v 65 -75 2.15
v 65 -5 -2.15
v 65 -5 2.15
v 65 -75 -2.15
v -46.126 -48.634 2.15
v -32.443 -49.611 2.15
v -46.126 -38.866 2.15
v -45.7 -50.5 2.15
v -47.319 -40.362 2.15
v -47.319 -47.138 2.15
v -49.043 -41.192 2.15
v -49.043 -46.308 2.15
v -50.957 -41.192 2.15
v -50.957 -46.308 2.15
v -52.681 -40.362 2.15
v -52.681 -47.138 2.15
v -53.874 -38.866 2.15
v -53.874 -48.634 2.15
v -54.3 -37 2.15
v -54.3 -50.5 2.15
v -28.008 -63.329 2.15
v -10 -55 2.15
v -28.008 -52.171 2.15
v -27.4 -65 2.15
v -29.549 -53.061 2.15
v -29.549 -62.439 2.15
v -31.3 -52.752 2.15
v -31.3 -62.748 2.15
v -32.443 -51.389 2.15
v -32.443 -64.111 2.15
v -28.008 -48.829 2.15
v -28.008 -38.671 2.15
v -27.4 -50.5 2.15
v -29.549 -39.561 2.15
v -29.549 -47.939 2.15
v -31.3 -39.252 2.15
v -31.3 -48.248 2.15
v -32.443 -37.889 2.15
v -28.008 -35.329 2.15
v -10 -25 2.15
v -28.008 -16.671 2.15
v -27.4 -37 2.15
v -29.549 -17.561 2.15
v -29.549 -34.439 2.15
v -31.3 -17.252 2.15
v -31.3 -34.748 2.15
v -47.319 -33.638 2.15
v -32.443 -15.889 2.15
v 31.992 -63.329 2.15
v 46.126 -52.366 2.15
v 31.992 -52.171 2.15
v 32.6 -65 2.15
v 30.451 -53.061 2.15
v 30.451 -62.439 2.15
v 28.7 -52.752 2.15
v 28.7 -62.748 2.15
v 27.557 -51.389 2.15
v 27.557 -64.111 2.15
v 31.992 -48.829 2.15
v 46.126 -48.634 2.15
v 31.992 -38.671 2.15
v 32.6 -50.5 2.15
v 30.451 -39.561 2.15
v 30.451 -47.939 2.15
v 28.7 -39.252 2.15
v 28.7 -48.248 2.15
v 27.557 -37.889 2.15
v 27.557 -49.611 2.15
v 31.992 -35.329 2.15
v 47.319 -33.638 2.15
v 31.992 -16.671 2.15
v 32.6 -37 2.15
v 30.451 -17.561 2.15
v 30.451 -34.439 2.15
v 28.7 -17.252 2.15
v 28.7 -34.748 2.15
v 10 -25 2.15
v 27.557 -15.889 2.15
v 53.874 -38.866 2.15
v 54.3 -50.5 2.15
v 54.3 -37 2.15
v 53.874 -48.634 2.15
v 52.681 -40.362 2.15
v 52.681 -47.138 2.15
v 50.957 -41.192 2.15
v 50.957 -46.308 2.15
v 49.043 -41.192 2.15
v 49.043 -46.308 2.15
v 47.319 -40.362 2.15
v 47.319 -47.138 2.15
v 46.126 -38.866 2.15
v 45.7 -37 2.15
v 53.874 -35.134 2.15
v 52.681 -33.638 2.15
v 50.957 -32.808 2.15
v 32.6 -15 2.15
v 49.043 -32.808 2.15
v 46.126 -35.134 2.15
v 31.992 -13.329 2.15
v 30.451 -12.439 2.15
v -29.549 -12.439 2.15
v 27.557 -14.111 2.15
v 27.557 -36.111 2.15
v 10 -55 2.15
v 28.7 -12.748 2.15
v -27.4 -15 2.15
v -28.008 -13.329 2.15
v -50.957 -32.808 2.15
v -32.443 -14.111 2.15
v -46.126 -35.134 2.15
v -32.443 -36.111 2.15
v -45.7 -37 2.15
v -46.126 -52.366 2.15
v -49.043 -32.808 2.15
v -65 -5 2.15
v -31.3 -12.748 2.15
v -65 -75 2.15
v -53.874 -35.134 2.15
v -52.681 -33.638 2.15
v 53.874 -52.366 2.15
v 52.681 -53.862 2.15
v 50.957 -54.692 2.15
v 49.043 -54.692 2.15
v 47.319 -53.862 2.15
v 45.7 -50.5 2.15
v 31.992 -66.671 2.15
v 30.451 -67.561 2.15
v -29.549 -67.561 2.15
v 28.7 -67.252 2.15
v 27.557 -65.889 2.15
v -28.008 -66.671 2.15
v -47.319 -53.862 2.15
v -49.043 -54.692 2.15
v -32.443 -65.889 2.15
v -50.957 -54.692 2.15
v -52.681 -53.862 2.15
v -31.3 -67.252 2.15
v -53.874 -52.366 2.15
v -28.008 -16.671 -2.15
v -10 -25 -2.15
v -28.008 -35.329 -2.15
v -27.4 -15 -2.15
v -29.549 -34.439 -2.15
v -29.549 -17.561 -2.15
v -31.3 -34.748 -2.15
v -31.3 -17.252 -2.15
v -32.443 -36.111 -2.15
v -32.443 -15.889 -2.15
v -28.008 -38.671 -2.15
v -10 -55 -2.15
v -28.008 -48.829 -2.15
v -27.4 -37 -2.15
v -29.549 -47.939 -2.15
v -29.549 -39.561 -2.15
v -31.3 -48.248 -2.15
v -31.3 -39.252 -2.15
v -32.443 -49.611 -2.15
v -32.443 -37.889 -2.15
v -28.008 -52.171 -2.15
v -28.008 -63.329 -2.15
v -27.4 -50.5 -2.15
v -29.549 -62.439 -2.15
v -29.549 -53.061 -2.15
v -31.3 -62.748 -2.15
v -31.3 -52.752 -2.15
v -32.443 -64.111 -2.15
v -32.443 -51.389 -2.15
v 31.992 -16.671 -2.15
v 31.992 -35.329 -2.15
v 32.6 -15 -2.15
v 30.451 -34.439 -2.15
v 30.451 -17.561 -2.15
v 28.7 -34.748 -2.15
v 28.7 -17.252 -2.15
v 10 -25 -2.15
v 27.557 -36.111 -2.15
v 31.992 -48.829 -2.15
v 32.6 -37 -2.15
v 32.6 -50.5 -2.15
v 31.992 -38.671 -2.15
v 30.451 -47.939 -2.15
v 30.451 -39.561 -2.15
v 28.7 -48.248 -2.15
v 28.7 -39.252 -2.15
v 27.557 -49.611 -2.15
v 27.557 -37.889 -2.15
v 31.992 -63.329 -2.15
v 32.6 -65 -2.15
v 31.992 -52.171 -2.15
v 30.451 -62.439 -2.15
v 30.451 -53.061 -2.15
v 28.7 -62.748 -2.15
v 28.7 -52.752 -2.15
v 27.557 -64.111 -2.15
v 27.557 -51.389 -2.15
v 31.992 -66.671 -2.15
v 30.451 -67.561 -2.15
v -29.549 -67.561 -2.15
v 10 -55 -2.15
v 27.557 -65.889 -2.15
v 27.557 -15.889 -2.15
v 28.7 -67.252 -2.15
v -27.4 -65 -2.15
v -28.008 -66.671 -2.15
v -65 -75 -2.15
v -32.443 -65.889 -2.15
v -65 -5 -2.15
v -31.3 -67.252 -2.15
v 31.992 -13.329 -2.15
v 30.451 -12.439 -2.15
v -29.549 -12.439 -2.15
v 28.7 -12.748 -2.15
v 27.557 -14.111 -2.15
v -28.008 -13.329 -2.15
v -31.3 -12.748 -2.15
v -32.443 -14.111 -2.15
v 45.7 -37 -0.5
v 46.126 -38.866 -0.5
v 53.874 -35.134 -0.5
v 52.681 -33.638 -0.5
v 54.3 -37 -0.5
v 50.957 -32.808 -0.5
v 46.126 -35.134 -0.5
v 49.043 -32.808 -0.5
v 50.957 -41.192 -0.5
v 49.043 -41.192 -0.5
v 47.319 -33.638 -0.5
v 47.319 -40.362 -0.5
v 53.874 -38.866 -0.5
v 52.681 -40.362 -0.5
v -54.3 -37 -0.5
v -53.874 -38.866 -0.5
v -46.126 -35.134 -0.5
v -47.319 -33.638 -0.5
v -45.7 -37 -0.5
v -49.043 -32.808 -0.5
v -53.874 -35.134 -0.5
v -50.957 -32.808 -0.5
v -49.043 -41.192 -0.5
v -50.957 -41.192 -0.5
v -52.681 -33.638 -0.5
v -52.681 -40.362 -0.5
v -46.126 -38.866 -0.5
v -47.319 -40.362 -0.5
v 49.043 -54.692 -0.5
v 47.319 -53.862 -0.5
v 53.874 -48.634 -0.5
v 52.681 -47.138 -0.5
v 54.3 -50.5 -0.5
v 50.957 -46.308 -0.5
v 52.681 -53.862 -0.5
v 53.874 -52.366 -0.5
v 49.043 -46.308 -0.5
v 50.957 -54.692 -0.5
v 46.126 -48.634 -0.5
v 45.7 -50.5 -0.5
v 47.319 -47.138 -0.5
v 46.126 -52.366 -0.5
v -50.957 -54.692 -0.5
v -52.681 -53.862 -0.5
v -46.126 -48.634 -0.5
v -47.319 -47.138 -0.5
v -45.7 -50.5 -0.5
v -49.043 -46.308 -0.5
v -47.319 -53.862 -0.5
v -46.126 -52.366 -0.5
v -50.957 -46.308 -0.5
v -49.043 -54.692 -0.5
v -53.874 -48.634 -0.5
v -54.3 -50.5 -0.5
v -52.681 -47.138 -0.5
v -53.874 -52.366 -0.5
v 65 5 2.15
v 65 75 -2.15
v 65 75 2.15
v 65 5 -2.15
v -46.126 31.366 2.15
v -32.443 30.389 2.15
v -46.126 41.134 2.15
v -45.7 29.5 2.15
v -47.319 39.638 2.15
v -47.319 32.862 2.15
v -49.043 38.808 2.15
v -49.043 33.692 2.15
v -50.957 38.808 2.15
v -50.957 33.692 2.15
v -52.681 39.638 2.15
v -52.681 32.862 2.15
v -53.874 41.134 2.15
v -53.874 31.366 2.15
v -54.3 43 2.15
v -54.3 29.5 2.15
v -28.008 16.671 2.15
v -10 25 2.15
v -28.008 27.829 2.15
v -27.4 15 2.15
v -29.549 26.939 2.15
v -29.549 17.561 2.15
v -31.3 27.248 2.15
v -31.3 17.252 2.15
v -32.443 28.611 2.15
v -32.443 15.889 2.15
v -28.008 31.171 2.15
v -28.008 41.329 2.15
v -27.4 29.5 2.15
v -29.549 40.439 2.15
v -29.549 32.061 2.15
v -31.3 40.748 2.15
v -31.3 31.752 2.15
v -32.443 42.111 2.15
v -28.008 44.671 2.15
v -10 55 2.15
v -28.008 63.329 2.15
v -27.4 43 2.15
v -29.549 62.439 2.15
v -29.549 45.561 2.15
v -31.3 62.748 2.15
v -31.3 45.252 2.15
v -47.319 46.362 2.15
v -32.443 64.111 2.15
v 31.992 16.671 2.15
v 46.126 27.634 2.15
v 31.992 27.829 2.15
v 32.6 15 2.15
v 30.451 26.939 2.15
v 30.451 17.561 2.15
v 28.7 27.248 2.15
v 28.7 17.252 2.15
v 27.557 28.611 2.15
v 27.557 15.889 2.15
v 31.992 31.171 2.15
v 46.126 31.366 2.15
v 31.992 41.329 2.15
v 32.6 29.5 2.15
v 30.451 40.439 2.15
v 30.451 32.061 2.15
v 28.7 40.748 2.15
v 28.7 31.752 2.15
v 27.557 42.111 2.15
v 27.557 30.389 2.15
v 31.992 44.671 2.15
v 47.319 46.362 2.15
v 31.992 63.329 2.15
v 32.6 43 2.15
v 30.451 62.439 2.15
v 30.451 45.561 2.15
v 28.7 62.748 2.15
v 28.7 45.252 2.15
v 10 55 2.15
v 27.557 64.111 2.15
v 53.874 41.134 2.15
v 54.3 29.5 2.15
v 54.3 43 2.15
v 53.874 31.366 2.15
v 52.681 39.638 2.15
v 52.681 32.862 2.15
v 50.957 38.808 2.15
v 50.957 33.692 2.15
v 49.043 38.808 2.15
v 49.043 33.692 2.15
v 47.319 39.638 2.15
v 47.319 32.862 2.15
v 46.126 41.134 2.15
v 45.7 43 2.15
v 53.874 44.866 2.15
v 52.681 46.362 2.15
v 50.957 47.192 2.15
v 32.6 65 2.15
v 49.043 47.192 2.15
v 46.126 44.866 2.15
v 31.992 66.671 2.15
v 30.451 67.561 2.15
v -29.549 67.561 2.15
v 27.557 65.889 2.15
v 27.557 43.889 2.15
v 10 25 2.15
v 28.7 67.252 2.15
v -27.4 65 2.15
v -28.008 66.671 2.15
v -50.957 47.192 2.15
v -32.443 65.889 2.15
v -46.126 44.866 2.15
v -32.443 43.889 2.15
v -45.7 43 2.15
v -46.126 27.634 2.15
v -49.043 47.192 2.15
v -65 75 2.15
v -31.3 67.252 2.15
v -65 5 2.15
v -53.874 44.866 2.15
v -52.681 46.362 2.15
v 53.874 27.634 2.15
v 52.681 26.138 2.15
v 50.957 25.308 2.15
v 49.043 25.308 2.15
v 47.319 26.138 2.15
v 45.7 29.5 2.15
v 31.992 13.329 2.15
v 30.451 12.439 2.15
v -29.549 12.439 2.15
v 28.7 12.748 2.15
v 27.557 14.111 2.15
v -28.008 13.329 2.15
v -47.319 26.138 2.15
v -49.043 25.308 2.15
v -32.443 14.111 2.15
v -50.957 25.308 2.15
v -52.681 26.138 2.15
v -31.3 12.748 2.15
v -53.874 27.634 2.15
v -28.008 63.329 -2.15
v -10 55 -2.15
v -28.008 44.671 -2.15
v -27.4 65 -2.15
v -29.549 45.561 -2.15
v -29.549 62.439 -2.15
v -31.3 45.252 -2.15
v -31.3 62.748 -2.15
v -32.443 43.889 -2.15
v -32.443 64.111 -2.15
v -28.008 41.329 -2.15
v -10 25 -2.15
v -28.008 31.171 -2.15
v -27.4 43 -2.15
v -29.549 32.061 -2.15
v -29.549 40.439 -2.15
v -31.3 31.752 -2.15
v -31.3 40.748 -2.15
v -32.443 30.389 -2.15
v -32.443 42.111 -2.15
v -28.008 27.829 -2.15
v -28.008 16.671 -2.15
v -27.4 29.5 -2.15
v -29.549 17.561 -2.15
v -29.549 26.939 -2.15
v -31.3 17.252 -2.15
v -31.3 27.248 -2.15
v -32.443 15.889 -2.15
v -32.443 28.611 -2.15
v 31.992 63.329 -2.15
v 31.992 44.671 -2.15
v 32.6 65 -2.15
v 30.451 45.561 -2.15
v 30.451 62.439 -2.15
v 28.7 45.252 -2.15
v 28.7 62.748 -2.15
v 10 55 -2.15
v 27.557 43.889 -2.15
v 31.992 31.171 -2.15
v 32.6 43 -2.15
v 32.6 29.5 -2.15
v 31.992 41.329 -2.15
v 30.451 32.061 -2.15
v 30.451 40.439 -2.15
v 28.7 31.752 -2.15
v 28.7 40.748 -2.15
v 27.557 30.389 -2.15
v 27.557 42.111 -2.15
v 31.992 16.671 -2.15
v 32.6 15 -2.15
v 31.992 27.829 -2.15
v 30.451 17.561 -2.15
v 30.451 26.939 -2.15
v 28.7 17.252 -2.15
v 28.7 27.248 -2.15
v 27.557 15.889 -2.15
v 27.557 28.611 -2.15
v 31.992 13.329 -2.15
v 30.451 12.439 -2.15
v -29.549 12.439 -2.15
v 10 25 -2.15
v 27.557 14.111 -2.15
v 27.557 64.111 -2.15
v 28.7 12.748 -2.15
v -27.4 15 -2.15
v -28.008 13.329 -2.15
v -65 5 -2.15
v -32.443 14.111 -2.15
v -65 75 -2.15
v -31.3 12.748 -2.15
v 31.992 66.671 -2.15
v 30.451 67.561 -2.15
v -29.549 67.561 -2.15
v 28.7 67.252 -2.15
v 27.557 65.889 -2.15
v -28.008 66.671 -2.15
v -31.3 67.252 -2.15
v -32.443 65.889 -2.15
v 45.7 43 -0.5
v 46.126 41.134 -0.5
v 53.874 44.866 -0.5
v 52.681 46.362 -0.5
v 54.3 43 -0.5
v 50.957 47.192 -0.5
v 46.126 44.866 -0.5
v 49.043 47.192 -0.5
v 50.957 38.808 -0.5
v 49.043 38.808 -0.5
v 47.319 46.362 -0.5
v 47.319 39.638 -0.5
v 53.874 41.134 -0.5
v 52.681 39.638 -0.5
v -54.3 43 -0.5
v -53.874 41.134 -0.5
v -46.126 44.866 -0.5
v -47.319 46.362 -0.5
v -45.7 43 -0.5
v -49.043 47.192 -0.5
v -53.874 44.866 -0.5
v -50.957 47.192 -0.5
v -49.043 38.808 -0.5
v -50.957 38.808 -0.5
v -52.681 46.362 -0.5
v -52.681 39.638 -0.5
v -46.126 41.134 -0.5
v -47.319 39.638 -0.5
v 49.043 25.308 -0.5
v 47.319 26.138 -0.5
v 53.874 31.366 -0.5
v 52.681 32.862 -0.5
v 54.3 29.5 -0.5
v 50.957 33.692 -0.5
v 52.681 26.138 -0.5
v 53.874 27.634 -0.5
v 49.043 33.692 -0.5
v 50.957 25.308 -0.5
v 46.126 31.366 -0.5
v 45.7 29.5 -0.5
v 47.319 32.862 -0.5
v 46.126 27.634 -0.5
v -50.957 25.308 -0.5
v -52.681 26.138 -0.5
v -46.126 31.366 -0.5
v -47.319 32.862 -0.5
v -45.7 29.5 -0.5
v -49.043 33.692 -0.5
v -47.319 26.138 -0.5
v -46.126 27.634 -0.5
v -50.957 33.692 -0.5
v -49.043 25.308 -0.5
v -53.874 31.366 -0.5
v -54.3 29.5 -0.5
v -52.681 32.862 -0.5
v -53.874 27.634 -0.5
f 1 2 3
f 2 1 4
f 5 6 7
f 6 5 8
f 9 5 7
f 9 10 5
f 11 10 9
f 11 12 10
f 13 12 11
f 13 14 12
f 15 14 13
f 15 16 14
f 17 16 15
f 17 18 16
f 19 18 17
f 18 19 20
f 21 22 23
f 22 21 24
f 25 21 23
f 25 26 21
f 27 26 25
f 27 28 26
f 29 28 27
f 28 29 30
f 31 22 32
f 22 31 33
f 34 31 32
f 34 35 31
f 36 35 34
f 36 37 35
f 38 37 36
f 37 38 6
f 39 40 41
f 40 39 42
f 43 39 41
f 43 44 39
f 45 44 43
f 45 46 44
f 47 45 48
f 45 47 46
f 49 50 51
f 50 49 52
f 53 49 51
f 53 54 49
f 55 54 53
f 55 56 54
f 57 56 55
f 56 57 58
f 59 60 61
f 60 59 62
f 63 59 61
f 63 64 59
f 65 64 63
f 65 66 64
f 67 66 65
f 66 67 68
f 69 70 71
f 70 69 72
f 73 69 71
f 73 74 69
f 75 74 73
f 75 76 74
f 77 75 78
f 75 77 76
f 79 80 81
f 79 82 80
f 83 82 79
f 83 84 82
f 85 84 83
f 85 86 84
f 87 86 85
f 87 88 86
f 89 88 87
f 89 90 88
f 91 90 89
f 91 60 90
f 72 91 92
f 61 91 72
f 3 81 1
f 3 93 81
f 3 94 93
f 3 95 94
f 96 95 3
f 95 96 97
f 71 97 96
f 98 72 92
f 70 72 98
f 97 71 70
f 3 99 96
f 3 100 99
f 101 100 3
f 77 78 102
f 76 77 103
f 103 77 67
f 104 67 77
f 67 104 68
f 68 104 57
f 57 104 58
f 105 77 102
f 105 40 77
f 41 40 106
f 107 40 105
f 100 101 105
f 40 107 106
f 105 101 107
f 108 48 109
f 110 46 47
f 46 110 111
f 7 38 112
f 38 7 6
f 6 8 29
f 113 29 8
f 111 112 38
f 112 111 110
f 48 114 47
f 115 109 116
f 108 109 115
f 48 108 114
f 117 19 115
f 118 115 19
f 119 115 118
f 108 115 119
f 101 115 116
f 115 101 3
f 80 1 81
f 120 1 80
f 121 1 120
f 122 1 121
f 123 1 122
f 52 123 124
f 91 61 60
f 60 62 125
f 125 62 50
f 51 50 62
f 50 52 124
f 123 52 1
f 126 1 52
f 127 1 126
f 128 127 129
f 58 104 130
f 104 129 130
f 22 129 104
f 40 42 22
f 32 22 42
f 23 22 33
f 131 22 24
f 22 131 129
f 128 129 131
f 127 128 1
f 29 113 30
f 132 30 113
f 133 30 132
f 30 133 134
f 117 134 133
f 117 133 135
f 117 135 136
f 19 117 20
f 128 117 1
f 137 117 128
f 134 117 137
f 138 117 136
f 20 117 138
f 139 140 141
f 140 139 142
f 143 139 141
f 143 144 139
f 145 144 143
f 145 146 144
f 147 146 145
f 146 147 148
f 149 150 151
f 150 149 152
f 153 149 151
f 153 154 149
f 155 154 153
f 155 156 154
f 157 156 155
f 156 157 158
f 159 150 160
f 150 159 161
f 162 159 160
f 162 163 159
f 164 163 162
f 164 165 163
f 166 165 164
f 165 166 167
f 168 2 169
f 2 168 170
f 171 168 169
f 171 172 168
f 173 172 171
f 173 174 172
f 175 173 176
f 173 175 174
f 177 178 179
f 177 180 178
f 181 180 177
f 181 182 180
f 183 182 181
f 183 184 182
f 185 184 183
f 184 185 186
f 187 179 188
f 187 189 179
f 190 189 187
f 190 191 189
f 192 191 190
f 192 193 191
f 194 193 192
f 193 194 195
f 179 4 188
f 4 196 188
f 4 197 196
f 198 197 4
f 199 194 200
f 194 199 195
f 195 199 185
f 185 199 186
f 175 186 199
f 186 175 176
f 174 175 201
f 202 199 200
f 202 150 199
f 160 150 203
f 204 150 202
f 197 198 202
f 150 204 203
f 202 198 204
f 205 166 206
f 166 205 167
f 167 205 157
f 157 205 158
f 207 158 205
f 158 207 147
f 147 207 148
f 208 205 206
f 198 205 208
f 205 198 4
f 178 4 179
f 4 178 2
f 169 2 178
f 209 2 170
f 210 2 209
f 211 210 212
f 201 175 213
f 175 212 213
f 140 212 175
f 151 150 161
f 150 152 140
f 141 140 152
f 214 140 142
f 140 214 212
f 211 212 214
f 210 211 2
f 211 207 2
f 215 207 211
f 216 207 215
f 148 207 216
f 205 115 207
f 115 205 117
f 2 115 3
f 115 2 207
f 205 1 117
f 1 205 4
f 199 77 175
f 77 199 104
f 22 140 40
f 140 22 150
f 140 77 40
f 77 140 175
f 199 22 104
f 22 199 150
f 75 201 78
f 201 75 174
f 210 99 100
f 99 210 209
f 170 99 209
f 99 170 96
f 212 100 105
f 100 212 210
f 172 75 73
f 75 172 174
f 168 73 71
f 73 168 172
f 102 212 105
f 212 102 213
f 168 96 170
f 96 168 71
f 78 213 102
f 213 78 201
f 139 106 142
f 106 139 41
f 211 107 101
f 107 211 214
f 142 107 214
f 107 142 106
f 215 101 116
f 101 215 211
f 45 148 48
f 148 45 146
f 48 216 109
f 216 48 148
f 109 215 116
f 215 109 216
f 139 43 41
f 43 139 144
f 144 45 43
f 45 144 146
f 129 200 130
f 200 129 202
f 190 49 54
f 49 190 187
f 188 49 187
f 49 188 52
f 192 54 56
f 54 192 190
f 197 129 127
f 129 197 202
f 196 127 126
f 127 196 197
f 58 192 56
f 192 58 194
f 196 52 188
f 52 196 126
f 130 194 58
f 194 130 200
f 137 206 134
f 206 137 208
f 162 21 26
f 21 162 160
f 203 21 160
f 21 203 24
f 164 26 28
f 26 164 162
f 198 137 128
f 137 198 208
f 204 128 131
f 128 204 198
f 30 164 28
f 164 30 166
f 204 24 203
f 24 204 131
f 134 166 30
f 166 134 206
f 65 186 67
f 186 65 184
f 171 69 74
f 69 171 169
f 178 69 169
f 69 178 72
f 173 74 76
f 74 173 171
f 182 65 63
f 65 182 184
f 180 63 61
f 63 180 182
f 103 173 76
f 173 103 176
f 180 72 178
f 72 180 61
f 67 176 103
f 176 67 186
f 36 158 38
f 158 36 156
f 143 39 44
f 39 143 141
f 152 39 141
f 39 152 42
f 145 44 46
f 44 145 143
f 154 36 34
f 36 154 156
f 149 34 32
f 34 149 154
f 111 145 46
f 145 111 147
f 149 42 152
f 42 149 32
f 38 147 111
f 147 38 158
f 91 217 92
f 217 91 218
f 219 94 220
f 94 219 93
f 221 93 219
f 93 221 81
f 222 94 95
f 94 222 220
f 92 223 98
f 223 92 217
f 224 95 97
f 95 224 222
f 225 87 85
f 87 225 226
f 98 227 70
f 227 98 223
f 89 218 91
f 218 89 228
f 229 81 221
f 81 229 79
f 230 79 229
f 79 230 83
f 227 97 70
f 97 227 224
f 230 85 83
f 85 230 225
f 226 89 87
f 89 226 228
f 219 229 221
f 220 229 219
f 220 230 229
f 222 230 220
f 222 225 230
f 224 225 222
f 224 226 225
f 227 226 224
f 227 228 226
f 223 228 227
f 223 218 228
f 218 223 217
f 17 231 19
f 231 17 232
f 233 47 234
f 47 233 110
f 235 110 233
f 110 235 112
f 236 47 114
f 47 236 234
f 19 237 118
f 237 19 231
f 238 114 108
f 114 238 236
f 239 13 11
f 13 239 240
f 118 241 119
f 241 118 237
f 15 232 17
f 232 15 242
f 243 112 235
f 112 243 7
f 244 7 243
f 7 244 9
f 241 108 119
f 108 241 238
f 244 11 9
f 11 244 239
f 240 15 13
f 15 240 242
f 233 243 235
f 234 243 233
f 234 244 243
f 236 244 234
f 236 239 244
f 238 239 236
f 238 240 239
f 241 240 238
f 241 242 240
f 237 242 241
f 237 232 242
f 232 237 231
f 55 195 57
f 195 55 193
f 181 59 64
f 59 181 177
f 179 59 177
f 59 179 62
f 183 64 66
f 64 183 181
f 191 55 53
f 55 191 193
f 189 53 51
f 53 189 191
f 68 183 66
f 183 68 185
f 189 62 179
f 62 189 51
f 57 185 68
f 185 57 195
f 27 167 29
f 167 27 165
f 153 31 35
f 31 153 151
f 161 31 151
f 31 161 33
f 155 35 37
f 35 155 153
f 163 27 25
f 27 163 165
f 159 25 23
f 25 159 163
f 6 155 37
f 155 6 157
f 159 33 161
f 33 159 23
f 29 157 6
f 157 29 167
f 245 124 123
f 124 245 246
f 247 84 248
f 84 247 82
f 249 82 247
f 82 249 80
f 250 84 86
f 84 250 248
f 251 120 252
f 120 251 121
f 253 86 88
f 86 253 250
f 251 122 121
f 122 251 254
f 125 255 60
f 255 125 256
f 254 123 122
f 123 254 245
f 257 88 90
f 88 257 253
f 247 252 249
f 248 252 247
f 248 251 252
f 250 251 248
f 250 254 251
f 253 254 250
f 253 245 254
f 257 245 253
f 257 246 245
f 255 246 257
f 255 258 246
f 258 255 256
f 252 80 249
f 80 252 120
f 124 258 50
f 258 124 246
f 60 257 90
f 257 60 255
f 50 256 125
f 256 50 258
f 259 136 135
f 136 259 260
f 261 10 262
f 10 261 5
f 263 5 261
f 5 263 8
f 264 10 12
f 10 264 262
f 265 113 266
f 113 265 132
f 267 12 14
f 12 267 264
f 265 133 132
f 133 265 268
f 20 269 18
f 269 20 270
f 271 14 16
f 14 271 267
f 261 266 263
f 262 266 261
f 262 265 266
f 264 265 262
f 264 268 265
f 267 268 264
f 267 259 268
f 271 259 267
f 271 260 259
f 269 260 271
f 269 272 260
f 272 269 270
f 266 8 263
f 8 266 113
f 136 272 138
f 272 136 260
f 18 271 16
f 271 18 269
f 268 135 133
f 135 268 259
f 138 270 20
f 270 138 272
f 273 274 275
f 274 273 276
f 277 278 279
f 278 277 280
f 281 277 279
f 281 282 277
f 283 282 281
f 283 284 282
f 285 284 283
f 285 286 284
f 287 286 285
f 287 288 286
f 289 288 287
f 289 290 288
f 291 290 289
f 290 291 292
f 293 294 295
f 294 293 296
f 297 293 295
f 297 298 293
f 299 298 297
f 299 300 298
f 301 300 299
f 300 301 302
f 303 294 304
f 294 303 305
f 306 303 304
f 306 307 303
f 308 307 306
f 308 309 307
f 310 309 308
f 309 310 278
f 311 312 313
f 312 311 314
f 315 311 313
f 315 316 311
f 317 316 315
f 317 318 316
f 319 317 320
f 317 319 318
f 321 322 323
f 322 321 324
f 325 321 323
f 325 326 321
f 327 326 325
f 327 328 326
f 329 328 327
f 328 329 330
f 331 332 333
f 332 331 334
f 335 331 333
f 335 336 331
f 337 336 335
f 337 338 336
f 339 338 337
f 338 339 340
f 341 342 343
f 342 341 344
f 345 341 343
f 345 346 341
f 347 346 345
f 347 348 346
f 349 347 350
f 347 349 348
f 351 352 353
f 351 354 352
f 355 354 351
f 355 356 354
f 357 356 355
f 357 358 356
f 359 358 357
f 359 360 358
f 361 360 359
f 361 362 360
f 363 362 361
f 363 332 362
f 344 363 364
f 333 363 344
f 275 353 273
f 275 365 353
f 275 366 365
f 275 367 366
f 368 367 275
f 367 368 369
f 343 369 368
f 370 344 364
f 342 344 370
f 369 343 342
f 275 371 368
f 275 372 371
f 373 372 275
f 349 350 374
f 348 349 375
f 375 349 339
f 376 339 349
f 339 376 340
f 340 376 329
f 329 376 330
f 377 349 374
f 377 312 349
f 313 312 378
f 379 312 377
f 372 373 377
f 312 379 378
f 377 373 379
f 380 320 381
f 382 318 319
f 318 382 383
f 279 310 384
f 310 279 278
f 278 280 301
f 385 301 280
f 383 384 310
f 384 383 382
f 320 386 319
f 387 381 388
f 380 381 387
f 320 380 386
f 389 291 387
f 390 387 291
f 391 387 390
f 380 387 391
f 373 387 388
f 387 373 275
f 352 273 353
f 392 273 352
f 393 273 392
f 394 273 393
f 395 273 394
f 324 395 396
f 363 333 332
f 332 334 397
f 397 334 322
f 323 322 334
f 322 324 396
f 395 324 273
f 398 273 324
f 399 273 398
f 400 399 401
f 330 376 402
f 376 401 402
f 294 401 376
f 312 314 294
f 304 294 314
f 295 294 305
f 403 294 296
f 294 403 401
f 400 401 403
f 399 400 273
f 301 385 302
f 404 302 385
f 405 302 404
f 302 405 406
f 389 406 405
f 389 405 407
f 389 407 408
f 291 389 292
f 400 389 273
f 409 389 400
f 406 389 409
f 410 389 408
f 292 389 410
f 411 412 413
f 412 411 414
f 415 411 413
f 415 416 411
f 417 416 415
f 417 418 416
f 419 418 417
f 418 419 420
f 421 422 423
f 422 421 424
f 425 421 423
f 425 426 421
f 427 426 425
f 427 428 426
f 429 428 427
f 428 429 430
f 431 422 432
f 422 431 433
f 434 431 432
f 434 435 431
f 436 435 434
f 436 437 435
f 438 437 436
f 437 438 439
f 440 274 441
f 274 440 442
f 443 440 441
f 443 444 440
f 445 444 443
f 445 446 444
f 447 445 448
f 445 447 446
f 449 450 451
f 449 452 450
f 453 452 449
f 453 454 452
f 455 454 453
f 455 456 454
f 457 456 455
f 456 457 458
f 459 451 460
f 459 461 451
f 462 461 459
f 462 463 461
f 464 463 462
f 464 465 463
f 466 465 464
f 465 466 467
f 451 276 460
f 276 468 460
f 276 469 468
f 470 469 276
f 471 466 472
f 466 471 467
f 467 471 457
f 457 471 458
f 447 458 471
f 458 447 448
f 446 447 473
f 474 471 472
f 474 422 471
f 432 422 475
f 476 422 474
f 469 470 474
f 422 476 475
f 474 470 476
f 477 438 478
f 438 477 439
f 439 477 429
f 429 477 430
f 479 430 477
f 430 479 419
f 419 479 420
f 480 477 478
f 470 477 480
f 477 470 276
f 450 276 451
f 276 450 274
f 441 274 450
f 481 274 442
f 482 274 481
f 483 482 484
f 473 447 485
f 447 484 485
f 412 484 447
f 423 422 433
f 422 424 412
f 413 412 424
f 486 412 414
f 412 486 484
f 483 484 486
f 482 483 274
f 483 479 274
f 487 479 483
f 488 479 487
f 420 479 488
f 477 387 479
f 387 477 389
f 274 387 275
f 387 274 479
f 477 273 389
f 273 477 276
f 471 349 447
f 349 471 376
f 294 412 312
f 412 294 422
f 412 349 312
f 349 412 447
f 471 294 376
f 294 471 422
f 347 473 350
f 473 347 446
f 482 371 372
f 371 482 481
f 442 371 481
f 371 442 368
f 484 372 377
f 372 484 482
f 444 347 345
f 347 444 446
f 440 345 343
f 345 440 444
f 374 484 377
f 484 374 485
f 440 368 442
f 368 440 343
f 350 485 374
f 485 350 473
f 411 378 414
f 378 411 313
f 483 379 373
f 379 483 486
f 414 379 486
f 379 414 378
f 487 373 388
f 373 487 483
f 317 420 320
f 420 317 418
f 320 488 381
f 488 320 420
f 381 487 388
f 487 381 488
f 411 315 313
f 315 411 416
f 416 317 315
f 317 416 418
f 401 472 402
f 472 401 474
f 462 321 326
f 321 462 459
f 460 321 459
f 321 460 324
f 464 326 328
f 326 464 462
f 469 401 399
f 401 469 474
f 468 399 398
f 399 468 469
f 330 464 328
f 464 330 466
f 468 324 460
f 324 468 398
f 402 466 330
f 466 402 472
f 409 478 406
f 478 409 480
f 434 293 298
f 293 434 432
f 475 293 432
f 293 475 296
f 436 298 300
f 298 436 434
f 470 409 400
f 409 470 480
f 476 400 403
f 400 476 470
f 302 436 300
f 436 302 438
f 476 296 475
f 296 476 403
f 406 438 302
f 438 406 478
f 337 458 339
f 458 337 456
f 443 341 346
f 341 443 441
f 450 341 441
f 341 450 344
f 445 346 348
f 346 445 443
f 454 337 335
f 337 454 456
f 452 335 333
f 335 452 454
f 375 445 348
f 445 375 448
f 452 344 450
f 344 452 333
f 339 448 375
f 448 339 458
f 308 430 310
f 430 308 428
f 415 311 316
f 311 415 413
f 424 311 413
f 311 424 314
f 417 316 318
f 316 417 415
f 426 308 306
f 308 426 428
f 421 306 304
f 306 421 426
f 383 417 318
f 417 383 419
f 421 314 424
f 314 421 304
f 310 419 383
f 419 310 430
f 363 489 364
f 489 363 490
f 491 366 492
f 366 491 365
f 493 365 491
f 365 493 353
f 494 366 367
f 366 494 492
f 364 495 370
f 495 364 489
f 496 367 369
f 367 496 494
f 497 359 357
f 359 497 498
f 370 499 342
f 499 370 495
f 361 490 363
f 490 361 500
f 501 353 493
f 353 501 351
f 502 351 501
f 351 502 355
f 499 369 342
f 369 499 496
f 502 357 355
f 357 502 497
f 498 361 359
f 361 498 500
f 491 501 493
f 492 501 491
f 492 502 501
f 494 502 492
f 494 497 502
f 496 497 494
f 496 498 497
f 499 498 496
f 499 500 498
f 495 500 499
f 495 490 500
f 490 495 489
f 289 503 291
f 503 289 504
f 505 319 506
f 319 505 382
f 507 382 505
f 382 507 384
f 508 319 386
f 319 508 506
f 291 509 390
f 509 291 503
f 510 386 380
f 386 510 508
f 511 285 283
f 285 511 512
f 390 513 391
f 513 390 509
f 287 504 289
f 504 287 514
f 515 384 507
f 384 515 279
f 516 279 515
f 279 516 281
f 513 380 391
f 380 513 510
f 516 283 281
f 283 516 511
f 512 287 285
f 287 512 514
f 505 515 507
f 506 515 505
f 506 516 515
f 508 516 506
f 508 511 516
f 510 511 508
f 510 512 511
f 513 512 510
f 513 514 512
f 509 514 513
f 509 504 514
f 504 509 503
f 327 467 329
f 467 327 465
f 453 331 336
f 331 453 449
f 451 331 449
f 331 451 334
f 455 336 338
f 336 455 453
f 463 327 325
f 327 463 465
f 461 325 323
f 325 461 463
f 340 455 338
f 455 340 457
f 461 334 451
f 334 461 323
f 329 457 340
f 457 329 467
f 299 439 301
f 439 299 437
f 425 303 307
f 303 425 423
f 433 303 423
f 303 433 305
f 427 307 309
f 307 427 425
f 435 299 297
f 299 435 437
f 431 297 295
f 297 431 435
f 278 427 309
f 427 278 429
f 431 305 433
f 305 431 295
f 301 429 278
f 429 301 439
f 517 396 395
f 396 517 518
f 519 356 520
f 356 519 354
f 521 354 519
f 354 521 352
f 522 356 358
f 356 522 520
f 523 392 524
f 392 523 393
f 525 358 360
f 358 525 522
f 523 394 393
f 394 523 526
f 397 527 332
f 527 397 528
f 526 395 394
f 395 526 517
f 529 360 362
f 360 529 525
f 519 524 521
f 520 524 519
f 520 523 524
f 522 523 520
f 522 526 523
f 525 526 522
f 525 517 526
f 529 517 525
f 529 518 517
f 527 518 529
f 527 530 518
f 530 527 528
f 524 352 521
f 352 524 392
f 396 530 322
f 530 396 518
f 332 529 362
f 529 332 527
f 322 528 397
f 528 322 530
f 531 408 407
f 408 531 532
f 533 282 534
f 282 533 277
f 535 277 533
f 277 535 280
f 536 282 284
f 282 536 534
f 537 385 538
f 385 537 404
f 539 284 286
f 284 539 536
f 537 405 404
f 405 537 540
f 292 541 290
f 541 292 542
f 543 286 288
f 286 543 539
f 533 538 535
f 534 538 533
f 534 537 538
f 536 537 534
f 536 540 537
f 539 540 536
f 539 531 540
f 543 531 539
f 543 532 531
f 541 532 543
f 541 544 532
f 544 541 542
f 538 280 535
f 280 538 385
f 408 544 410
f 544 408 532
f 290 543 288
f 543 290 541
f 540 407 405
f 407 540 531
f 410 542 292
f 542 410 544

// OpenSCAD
module y_plane (x, y, h)
{
    hh = h + 0.7;
    // max down 38 mm from current position
    // Limited by nut for mounting nut holder which must be above lower
    // frame. Lower frame is 20mm from bottom of this holder. Nut width
    // of M5 is 8mm, we add 1mm.
    md = min (38 - 25, y / 2 - 20 - 9 / 2);
    difference () {
        cube ([x, y, h], center = true);
        cube ([20, 30, 5], center = true);
        translate ([ 30,  25, 0])
            cylinder (r = 2.6, h = hh, center = true);
        translate ([-30,  25, 0])
            cylinder (r = 2.6, h = hh, center = true);
        translate ([ 30, -25, 0])
            cylinder (r = 2.6, h = hh, center = true);
        translate ([-30, -25, 0])
            cylinder (r = 2.6, h = hh, center = true);

        // Down 22 mm from current position
        // This optimizes usable Y-axis length as the upper table won't
        // collide with the frame but can move beyond it
        translate ([ 30,  25 - 22, 0])
            cylinder (r = 2.6, h = hh, center = true);
        translate ([-30,  25 - 22, 0])
            cylinder (r = 2.6, h = hh, center = true);
        translate ([ 50,  25 - 22, 2])
            cylinder (r = 4.3, h = hh, center = true);
        translate ([-50,  25 - 22, 2])
            cylinder (r = 4.3, h = hh, center = true);

        // Down md (max 38mm) from current position: optimize usable height
        translate ([ 30,  -md, 0])
            cylinder (r = 2.6, h = hh, center = true);
        translate ([-30,  -md, 0])
            cylinder (r = 2.6, h = hh, center = true);
        translate ([ 50,  -md, 2])
            cylinder (r = 4.3, h = hh, center = true);
        translate ([-50,  -md, 2])
            cylinder (r = 4.3, h = hh, center = true);
    }
}

h  = 4.3;
x  = 130;
y  = 70;
translate ([0, -40, 0])
    y_plane (x, y, h);
translate ([0,  40, 0])
    y_plane (x, y, h);
